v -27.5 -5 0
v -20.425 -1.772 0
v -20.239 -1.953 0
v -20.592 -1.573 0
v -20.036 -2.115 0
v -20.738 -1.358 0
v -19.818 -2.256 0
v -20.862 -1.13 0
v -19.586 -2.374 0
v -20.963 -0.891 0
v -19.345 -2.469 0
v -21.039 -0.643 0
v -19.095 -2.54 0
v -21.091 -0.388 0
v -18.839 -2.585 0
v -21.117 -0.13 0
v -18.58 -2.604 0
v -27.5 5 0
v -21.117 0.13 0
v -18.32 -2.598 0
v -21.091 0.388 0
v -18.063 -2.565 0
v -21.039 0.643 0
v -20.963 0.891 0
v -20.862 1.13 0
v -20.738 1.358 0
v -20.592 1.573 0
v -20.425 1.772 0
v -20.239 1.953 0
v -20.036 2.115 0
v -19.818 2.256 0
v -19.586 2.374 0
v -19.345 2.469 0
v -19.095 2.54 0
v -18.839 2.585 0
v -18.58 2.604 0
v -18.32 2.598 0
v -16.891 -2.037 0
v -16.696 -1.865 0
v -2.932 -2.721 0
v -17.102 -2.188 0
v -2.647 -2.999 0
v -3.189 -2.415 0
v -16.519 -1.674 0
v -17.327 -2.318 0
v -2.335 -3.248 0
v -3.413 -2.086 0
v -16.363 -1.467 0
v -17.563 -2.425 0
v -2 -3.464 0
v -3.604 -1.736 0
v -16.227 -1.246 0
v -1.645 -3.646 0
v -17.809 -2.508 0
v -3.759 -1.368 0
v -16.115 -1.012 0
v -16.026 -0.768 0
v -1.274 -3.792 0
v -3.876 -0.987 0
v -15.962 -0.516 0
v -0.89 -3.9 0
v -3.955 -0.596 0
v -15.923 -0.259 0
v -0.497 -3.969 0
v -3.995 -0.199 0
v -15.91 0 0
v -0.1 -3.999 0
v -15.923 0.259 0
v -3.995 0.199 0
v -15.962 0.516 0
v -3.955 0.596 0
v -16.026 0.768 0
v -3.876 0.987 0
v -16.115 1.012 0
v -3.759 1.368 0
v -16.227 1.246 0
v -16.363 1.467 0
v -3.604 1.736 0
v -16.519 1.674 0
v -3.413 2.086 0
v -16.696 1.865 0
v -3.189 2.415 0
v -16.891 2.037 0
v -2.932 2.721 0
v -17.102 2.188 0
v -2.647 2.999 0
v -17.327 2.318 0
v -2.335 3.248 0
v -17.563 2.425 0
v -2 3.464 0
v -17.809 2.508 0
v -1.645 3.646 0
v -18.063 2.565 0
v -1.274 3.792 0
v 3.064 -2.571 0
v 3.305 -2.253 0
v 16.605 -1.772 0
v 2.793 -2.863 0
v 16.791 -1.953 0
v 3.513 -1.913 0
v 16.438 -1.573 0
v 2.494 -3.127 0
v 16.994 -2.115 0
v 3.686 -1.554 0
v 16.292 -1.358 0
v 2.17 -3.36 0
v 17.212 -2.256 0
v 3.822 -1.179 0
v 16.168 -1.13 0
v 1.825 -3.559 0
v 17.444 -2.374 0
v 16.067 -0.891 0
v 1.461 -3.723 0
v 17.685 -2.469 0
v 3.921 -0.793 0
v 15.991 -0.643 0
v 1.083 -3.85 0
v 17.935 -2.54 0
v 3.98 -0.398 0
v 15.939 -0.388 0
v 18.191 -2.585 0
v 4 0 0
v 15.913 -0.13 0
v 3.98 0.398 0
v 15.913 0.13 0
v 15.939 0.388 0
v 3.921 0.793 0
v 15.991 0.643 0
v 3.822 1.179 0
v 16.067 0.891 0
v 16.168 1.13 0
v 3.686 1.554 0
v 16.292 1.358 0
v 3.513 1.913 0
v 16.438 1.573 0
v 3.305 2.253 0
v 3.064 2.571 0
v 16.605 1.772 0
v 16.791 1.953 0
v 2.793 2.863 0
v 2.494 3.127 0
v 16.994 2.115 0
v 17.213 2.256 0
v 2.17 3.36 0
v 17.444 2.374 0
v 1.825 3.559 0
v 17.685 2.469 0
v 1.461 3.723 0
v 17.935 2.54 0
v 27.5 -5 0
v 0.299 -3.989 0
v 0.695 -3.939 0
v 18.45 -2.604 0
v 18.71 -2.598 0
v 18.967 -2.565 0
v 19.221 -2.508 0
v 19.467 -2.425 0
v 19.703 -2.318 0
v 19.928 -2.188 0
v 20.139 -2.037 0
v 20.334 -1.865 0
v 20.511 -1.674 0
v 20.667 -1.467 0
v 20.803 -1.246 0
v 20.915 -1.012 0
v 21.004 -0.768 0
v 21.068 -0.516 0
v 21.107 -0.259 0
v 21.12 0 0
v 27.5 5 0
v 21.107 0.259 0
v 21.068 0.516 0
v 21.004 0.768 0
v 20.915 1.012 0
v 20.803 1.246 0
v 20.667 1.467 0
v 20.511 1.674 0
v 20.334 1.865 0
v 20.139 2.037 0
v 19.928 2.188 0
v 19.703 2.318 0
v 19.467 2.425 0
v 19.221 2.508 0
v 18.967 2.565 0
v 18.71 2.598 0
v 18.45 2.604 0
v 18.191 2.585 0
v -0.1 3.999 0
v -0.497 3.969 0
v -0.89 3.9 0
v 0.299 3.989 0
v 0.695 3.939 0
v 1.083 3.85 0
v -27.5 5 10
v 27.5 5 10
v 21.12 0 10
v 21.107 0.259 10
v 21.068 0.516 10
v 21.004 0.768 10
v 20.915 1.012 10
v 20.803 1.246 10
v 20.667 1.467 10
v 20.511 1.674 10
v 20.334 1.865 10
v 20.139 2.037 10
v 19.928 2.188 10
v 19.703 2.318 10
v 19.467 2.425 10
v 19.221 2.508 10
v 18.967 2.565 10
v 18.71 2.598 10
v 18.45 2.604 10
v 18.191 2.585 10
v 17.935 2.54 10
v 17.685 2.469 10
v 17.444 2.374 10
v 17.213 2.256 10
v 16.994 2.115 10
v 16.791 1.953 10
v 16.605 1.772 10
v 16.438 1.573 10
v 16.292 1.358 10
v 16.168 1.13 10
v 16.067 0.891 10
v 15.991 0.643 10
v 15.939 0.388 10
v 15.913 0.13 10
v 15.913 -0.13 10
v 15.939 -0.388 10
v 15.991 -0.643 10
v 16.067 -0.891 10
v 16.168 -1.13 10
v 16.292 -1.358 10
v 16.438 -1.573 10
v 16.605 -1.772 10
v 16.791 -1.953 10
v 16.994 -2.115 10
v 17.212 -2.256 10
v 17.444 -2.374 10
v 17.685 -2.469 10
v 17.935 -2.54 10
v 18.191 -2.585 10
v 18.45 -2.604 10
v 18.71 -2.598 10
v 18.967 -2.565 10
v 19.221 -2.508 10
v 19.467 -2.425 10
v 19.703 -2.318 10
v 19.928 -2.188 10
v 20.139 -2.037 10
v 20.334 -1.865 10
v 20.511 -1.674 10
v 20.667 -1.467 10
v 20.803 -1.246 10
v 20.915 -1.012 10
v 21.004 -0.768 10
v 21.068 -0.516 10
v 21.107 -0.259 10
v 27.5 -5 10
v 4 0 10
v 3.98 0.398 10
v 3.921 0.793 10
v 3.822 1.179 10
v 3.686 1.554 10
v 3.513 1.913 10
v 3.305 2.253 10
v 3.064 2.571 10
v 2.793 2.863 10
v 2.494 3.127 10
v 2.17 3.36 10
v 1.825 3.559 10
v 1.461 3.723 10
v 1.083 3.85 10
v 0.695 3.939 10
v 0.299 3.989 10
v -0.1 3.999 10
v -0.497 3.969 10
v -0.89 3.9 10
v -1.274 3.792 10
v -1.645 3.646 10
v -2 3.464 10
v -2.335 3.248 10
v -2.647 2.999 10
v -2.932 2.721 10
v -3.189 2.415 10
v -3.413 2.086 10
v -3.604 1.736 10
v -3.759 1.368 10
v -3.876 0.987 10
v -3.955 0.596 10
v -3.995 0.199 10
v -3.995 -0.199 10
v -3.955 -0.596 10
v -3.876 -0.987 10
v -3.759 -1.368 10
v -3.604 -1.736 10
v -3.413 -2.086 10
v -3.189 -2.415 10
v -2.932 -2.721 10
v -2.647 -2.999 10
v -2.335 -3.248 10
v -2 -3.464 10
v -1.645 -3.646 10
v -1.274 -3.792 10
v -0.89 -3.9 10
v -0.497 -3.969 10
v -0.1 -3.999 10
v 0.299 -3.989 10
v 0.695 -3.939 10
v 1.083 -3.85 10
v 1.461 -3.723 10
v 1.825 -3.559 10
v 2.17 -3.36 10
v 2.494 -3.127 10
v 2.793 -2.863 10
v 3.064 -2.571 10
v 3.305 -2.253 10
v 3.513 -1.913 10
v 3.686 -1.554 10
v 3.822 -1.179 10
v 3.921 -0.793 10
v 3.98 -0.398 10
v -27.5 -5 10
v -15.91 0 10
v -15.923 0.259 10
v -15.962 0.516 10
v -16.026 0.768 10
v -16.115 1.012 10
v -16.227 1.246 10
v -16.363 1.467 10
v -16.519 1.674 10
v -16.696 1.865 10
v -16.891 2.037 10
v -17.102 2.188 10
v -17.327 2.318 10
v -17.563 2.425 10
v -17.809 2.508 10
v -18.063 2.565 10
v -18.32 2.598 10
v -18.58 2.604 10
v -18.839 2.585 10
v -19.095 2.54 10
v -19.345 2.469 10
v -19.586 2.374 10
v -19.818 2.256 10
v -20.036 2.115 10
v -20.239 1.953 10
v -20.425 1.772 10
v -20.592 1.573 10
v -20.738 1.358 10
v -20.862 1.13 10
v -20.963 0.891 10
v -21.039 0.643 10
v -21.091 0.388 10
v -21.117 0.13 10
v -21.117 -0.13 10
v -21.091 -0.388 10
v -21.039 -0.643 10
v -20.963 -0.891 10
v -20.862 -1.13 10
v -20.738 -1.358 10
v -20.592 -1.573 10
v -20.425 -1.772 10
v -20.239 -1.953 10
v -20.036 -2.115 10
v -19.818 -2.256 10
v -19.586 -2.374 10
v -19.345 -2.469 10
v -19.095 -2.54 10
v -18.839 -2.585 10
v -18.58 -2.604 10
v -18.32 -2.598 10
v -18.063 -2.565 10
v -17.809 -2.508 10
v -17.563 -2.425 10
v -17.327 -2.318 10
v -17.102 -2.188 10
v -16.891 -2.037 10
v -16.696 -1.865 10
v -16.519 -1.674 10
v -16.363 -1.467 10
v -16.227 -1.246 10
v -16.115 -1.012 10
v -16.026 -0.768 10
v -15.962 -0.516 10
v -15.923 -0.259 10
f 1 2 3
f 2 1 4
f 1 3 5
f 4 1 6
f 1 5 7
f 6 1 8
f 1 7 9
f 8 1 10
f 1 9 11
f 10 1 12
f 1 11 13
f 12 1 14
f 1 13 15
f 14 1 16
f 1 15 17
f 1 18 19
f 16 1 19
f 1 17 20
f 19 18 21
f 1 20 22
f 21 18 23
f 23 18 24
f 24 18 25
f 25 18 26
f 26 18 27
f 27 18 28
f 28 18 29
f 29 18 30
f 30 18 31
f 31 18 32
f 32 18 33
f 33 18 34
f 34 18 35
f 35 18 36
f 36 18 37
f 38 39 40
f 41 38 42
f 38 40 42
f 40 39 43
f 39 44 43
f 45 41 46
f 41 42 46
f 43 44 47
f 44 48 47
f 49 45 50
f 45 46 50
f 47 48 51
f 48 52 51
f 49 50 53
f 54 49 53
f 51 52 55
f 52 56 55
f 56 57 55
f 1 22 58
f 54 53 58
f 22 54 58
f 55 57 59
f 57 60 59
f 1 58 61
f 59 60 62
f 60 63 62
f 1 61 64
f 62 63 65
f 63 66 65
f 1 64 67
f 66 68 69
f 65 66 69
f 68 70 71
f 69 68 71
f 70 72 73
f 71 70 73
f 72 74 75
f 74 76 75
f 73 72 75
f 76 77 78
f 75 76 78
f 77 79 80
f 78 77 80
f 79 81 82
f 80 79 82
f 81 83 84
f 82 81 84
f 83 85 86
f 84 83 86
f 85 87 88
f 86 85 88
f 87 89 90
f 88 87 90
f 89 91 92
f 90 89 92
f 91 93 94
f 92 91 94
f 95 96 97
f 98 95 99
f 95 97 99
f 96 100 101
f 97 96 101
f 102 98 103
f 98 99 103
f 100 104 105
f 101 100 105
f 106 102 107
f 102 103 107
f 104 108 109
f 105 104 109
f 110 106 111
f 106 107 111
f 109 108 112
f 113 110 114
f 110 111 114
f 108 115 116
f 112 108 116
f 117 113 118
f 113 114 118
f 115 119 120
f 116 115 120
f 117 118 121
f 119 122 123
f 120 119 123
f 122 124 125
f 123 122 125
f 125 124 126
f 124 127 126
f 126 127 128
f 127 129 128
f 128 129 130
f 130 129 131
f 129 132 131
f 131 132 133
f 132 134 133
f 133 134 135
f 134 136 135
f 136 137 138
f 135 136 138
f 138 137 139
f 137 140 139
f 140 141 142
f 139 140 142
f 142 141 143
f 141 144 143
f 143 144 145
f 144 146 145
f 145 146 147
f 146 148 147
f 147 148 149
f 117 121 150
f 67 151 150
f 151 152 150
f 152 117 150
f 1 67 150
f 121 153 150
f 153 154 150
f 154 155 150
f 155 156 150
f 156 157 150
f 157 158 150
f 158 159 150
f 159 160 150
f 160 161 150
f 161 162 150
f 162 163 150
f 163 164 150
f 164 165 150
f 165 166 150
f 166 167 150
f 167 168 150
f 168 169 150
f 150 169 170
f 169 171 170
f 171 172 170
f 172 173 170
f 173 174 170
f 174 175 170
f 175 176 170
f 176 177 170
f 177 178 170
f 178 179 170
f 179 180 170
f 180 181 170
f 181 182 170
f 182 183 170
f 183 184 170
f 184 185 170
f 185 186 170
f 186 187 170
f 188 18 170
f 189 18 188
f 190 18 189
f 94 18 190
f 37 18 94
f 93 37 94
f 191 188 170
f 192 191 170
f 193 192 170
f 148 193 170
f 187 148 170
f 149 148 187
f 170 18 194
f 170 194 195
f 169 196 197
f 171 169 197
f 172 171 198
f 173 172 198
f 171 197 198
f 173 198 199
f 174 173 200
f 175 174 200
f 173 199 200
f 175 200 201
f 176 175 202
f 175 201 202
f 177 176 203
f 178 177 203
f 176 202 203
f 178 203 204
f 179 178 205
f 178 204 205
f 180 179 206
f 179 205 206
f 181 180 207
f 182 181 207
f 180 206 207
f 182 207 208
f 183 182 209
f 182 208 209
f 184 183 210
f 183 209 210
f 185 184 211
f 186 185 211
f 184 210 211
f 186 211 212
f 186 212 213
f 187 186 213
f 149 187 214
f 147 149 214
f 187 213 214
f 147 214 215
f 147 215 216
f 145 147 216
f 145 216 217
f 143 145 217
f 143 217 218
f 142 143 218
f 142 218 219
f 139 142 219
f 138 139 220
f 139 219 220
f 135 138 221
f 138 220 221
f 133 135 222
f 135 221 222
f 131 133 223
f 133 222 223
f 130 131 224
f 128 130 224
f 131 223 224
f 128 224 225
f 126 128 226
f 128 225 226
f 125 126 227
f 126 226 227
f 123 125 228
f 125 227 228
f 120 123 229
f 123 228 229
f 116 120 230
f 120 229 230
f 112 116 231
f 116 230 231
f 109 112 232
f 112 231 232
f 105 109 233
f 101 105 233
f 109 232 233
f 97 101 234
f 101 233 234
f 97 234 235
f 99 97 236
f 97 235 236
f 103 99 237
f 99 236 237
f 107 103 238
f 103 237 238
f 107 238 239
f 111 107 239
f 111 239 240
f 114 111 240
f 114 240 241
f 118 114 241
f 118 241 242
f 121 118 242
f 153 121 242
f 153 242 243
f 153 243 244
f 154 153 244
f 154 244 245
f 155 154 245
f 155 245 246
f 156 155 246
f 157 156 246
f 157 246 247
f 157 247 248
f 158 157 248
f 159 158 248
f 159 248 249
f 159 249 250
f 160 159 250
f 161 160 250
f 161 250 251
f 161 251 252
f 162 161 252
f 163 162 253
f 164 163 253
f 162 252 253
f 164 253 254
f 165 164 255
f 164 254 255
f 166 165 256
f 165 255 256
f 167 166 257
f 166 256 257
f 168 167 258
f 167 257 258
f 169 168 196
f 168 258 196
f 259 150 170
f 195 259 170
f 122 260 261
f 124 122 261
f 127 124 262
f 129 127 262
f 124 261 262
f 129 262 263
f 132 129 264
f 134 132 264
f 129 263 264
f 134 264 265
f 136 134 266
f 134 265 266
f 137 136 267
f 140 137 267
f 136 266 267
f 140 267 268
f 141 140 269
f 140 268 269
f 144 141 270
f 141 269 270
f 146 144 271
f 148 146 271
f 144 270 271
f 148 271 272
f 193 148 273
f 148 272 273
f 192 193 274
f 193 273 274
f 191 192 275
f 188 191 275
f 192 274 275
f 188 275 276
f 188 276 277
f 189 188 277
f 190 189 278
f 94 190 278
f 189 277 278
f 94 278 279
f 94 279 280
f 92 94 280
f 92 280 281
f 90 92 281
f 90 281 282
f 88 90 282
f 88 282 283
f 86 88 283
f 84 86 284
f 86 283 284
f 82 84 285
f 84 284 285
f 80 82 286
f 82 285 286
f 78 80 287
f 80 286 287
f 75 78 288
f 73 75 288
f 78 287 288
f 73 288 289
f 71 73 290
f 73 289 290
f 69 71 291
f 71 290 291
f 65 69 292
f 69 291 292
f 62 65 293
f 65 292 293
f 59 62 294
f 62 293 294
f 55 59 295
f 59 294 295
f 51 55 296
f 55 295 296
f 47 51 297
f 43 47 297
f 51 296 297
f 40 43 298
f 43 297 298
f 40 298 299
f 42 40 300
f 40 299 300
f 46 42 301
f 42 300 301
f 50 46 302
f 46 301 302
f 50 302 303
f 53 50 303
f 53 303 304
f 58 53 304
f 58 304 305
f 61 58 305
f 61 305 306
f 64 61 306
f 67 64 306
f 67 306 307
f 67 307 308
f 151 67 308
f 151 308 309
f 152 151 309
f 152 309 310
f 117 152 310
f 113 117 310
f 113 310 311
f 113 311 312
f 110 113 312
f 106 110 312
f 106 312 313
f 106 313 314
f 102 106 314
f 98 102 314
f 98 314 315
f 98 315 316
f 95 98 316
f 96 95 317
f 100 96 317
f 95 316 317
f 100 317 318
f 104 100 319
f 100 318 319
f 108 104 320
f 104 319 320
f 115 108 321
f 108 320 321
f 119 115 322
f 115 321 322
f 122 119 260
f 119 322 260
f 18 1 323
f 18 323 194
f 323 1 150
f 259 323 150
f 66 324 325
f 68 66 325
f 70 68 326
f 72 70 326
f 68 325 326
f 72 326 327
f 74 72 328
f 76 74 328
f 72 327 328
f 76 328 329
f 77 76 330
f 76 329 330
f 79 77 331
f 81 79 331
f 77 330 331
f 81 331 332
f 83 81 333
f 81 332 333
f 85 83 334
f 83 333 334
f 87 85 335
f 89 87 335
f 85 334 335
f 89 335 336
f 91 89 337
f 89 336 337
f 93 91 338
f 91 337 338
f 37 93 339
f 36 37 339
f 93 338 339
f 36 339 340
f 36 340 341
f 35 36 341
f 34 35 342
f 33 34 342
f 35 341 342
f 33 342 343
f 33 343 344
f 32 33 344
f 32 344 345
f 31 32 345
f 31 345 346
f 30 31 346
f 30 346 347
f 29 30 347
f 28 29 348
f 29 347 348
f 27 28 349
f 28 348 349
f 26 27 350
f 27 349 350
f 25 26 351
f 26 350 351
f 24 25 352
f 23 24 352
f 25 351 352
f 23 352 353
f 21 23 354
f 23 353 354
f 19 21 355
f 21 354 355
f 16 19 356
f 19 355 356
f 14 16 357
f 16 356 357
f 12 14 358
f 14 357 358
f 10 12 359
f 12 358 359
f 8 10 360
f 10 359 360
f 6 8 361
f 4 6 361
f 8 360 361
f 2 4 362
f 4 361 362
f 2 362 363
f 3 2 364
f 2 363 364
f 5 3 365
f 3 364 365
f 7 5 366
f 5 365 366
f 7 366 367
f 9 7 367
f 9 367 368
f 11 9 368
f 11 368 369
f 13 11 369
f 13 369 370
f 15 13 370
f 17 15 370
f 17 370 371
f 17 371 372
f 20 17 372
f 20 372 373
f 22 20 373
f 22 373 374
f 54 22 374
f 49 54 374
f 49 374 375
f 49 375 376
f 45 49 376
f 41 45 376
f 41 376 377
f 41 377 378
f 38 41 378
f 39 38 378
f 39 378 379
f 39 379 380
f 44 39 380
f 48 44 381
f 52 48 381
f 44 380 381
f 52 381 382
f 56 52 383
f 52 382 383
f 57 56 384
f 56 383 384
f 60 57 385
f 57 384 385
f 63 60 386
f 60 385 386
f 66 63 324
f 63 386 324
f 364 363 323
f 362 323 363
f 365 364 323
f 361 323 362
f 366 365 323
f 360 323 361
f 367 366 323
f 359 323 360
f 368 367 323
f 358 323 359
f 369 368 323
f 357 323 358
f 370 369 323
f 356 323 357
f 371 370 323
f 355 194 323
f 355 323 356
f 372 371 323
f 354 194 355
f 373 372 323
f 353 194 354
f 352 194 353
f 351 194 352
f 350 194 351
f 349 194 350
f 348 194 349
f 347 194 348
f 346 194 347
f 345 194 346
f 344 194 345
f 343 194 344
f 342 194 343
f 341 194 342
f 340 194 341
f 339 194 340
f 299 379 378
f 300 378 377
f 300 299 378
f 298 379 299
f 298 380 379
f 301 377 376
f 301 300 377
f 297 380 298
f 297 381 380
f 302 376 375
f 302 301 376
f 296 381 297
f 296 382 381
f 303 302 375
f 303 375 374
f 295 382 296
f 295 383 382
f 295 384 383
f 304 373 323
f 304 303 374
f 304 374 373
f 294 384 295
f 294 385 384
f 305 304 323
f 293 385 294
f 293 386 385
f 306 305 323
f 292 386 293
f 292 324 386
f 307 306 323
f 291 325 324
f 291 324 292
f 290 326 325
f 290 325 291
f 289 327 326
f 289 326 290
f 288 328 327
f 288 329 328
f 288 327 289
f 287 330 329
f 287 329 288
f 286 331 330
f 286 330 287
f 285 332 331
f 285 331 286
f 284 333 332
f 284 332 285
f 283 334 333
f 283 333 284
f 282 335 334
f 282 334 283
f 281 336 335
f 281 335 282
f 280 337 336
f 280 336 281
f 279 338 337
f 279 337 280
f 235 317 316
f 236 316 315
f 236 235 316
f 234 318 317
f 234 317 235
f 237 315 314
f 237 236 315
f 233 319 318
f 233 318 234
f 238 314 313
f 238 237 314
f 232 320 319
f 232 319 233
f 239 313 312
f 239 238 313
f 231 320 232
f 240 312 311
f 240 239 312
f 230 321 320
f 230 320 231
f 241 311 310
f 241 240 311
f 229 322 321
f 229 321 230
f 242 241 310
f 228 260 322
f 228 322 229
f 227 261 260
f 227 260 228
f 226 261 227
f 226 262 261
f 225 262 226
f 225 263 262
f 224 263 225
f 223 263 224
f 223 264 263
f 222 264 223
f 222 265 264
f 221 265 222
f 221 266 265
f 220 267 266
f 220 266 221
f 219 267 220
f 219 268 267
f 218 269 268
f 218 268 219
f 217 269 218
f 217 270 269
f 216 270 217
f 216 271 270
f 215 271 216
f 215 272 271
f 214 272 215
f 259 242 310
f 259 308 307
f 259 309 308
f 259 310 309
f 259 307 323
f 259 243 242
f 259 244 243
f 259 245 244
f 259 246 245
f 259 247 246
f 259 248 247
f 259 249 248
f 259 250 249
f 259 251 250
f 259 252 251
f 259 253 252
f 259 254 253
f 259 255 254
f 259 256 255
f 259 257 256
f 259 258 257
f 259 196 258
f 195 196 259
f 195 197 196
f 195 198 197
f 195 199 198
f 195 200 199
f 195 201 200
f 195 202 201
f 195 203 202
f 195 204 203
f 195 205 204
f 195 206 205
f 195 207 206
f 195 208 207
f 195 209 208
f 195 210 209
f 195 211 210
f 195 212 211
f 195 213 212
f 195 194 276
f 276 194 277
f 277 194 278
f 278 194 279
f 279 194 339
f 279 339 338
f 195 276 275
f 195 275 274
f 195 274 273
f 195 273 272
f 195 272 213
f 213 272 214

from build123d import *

# Parameters (mm, degrees)
SKETCH_1_W          = 55
SKETCH_1_H          = 10
EXTRUDE_1_DEPTH     = 10
SKETCH_2_R          = 2.605
CUT_EXTRUDE_1_DEPTH = 10
SKETCH_3_R          = 4
CUT_EXTRUDE_2_DEPTH = 10


with BuildPart() as part:
    # 草图1 → 凸台-拉伸1 (new body)
    with BuildSketch(Plane.XY):
        Rectangle(SKETCH_1_W, SKETCH_1_H)
    extrude(amount=EXTRUDE_1_DEPTH)

    # 草图2 → 切除-拉伸1 (cut)
    with BuildSketch(Plane.XY.offset(10)):
        with Locations((18.515, 0)):
            Circle(SKETCH_2_R)
        with Locations((-18.515, 0)):
            Circle(SKETCH_2_R)
    extrude(amount=-CUT_EXTRUDE_1_DEPTH, mode=Mode.SUBTRACT)

    # 草图3 → 切除-拉伸2 (cut)
    with BuildSketch(Plane.XY.offset(10)):
        Circle(SKETCH_3_R)
    extrude(amount=-CUT_EXTRUDE_2_DEPTH, mode=Mode.SUBTRACT)


solid = part.part
